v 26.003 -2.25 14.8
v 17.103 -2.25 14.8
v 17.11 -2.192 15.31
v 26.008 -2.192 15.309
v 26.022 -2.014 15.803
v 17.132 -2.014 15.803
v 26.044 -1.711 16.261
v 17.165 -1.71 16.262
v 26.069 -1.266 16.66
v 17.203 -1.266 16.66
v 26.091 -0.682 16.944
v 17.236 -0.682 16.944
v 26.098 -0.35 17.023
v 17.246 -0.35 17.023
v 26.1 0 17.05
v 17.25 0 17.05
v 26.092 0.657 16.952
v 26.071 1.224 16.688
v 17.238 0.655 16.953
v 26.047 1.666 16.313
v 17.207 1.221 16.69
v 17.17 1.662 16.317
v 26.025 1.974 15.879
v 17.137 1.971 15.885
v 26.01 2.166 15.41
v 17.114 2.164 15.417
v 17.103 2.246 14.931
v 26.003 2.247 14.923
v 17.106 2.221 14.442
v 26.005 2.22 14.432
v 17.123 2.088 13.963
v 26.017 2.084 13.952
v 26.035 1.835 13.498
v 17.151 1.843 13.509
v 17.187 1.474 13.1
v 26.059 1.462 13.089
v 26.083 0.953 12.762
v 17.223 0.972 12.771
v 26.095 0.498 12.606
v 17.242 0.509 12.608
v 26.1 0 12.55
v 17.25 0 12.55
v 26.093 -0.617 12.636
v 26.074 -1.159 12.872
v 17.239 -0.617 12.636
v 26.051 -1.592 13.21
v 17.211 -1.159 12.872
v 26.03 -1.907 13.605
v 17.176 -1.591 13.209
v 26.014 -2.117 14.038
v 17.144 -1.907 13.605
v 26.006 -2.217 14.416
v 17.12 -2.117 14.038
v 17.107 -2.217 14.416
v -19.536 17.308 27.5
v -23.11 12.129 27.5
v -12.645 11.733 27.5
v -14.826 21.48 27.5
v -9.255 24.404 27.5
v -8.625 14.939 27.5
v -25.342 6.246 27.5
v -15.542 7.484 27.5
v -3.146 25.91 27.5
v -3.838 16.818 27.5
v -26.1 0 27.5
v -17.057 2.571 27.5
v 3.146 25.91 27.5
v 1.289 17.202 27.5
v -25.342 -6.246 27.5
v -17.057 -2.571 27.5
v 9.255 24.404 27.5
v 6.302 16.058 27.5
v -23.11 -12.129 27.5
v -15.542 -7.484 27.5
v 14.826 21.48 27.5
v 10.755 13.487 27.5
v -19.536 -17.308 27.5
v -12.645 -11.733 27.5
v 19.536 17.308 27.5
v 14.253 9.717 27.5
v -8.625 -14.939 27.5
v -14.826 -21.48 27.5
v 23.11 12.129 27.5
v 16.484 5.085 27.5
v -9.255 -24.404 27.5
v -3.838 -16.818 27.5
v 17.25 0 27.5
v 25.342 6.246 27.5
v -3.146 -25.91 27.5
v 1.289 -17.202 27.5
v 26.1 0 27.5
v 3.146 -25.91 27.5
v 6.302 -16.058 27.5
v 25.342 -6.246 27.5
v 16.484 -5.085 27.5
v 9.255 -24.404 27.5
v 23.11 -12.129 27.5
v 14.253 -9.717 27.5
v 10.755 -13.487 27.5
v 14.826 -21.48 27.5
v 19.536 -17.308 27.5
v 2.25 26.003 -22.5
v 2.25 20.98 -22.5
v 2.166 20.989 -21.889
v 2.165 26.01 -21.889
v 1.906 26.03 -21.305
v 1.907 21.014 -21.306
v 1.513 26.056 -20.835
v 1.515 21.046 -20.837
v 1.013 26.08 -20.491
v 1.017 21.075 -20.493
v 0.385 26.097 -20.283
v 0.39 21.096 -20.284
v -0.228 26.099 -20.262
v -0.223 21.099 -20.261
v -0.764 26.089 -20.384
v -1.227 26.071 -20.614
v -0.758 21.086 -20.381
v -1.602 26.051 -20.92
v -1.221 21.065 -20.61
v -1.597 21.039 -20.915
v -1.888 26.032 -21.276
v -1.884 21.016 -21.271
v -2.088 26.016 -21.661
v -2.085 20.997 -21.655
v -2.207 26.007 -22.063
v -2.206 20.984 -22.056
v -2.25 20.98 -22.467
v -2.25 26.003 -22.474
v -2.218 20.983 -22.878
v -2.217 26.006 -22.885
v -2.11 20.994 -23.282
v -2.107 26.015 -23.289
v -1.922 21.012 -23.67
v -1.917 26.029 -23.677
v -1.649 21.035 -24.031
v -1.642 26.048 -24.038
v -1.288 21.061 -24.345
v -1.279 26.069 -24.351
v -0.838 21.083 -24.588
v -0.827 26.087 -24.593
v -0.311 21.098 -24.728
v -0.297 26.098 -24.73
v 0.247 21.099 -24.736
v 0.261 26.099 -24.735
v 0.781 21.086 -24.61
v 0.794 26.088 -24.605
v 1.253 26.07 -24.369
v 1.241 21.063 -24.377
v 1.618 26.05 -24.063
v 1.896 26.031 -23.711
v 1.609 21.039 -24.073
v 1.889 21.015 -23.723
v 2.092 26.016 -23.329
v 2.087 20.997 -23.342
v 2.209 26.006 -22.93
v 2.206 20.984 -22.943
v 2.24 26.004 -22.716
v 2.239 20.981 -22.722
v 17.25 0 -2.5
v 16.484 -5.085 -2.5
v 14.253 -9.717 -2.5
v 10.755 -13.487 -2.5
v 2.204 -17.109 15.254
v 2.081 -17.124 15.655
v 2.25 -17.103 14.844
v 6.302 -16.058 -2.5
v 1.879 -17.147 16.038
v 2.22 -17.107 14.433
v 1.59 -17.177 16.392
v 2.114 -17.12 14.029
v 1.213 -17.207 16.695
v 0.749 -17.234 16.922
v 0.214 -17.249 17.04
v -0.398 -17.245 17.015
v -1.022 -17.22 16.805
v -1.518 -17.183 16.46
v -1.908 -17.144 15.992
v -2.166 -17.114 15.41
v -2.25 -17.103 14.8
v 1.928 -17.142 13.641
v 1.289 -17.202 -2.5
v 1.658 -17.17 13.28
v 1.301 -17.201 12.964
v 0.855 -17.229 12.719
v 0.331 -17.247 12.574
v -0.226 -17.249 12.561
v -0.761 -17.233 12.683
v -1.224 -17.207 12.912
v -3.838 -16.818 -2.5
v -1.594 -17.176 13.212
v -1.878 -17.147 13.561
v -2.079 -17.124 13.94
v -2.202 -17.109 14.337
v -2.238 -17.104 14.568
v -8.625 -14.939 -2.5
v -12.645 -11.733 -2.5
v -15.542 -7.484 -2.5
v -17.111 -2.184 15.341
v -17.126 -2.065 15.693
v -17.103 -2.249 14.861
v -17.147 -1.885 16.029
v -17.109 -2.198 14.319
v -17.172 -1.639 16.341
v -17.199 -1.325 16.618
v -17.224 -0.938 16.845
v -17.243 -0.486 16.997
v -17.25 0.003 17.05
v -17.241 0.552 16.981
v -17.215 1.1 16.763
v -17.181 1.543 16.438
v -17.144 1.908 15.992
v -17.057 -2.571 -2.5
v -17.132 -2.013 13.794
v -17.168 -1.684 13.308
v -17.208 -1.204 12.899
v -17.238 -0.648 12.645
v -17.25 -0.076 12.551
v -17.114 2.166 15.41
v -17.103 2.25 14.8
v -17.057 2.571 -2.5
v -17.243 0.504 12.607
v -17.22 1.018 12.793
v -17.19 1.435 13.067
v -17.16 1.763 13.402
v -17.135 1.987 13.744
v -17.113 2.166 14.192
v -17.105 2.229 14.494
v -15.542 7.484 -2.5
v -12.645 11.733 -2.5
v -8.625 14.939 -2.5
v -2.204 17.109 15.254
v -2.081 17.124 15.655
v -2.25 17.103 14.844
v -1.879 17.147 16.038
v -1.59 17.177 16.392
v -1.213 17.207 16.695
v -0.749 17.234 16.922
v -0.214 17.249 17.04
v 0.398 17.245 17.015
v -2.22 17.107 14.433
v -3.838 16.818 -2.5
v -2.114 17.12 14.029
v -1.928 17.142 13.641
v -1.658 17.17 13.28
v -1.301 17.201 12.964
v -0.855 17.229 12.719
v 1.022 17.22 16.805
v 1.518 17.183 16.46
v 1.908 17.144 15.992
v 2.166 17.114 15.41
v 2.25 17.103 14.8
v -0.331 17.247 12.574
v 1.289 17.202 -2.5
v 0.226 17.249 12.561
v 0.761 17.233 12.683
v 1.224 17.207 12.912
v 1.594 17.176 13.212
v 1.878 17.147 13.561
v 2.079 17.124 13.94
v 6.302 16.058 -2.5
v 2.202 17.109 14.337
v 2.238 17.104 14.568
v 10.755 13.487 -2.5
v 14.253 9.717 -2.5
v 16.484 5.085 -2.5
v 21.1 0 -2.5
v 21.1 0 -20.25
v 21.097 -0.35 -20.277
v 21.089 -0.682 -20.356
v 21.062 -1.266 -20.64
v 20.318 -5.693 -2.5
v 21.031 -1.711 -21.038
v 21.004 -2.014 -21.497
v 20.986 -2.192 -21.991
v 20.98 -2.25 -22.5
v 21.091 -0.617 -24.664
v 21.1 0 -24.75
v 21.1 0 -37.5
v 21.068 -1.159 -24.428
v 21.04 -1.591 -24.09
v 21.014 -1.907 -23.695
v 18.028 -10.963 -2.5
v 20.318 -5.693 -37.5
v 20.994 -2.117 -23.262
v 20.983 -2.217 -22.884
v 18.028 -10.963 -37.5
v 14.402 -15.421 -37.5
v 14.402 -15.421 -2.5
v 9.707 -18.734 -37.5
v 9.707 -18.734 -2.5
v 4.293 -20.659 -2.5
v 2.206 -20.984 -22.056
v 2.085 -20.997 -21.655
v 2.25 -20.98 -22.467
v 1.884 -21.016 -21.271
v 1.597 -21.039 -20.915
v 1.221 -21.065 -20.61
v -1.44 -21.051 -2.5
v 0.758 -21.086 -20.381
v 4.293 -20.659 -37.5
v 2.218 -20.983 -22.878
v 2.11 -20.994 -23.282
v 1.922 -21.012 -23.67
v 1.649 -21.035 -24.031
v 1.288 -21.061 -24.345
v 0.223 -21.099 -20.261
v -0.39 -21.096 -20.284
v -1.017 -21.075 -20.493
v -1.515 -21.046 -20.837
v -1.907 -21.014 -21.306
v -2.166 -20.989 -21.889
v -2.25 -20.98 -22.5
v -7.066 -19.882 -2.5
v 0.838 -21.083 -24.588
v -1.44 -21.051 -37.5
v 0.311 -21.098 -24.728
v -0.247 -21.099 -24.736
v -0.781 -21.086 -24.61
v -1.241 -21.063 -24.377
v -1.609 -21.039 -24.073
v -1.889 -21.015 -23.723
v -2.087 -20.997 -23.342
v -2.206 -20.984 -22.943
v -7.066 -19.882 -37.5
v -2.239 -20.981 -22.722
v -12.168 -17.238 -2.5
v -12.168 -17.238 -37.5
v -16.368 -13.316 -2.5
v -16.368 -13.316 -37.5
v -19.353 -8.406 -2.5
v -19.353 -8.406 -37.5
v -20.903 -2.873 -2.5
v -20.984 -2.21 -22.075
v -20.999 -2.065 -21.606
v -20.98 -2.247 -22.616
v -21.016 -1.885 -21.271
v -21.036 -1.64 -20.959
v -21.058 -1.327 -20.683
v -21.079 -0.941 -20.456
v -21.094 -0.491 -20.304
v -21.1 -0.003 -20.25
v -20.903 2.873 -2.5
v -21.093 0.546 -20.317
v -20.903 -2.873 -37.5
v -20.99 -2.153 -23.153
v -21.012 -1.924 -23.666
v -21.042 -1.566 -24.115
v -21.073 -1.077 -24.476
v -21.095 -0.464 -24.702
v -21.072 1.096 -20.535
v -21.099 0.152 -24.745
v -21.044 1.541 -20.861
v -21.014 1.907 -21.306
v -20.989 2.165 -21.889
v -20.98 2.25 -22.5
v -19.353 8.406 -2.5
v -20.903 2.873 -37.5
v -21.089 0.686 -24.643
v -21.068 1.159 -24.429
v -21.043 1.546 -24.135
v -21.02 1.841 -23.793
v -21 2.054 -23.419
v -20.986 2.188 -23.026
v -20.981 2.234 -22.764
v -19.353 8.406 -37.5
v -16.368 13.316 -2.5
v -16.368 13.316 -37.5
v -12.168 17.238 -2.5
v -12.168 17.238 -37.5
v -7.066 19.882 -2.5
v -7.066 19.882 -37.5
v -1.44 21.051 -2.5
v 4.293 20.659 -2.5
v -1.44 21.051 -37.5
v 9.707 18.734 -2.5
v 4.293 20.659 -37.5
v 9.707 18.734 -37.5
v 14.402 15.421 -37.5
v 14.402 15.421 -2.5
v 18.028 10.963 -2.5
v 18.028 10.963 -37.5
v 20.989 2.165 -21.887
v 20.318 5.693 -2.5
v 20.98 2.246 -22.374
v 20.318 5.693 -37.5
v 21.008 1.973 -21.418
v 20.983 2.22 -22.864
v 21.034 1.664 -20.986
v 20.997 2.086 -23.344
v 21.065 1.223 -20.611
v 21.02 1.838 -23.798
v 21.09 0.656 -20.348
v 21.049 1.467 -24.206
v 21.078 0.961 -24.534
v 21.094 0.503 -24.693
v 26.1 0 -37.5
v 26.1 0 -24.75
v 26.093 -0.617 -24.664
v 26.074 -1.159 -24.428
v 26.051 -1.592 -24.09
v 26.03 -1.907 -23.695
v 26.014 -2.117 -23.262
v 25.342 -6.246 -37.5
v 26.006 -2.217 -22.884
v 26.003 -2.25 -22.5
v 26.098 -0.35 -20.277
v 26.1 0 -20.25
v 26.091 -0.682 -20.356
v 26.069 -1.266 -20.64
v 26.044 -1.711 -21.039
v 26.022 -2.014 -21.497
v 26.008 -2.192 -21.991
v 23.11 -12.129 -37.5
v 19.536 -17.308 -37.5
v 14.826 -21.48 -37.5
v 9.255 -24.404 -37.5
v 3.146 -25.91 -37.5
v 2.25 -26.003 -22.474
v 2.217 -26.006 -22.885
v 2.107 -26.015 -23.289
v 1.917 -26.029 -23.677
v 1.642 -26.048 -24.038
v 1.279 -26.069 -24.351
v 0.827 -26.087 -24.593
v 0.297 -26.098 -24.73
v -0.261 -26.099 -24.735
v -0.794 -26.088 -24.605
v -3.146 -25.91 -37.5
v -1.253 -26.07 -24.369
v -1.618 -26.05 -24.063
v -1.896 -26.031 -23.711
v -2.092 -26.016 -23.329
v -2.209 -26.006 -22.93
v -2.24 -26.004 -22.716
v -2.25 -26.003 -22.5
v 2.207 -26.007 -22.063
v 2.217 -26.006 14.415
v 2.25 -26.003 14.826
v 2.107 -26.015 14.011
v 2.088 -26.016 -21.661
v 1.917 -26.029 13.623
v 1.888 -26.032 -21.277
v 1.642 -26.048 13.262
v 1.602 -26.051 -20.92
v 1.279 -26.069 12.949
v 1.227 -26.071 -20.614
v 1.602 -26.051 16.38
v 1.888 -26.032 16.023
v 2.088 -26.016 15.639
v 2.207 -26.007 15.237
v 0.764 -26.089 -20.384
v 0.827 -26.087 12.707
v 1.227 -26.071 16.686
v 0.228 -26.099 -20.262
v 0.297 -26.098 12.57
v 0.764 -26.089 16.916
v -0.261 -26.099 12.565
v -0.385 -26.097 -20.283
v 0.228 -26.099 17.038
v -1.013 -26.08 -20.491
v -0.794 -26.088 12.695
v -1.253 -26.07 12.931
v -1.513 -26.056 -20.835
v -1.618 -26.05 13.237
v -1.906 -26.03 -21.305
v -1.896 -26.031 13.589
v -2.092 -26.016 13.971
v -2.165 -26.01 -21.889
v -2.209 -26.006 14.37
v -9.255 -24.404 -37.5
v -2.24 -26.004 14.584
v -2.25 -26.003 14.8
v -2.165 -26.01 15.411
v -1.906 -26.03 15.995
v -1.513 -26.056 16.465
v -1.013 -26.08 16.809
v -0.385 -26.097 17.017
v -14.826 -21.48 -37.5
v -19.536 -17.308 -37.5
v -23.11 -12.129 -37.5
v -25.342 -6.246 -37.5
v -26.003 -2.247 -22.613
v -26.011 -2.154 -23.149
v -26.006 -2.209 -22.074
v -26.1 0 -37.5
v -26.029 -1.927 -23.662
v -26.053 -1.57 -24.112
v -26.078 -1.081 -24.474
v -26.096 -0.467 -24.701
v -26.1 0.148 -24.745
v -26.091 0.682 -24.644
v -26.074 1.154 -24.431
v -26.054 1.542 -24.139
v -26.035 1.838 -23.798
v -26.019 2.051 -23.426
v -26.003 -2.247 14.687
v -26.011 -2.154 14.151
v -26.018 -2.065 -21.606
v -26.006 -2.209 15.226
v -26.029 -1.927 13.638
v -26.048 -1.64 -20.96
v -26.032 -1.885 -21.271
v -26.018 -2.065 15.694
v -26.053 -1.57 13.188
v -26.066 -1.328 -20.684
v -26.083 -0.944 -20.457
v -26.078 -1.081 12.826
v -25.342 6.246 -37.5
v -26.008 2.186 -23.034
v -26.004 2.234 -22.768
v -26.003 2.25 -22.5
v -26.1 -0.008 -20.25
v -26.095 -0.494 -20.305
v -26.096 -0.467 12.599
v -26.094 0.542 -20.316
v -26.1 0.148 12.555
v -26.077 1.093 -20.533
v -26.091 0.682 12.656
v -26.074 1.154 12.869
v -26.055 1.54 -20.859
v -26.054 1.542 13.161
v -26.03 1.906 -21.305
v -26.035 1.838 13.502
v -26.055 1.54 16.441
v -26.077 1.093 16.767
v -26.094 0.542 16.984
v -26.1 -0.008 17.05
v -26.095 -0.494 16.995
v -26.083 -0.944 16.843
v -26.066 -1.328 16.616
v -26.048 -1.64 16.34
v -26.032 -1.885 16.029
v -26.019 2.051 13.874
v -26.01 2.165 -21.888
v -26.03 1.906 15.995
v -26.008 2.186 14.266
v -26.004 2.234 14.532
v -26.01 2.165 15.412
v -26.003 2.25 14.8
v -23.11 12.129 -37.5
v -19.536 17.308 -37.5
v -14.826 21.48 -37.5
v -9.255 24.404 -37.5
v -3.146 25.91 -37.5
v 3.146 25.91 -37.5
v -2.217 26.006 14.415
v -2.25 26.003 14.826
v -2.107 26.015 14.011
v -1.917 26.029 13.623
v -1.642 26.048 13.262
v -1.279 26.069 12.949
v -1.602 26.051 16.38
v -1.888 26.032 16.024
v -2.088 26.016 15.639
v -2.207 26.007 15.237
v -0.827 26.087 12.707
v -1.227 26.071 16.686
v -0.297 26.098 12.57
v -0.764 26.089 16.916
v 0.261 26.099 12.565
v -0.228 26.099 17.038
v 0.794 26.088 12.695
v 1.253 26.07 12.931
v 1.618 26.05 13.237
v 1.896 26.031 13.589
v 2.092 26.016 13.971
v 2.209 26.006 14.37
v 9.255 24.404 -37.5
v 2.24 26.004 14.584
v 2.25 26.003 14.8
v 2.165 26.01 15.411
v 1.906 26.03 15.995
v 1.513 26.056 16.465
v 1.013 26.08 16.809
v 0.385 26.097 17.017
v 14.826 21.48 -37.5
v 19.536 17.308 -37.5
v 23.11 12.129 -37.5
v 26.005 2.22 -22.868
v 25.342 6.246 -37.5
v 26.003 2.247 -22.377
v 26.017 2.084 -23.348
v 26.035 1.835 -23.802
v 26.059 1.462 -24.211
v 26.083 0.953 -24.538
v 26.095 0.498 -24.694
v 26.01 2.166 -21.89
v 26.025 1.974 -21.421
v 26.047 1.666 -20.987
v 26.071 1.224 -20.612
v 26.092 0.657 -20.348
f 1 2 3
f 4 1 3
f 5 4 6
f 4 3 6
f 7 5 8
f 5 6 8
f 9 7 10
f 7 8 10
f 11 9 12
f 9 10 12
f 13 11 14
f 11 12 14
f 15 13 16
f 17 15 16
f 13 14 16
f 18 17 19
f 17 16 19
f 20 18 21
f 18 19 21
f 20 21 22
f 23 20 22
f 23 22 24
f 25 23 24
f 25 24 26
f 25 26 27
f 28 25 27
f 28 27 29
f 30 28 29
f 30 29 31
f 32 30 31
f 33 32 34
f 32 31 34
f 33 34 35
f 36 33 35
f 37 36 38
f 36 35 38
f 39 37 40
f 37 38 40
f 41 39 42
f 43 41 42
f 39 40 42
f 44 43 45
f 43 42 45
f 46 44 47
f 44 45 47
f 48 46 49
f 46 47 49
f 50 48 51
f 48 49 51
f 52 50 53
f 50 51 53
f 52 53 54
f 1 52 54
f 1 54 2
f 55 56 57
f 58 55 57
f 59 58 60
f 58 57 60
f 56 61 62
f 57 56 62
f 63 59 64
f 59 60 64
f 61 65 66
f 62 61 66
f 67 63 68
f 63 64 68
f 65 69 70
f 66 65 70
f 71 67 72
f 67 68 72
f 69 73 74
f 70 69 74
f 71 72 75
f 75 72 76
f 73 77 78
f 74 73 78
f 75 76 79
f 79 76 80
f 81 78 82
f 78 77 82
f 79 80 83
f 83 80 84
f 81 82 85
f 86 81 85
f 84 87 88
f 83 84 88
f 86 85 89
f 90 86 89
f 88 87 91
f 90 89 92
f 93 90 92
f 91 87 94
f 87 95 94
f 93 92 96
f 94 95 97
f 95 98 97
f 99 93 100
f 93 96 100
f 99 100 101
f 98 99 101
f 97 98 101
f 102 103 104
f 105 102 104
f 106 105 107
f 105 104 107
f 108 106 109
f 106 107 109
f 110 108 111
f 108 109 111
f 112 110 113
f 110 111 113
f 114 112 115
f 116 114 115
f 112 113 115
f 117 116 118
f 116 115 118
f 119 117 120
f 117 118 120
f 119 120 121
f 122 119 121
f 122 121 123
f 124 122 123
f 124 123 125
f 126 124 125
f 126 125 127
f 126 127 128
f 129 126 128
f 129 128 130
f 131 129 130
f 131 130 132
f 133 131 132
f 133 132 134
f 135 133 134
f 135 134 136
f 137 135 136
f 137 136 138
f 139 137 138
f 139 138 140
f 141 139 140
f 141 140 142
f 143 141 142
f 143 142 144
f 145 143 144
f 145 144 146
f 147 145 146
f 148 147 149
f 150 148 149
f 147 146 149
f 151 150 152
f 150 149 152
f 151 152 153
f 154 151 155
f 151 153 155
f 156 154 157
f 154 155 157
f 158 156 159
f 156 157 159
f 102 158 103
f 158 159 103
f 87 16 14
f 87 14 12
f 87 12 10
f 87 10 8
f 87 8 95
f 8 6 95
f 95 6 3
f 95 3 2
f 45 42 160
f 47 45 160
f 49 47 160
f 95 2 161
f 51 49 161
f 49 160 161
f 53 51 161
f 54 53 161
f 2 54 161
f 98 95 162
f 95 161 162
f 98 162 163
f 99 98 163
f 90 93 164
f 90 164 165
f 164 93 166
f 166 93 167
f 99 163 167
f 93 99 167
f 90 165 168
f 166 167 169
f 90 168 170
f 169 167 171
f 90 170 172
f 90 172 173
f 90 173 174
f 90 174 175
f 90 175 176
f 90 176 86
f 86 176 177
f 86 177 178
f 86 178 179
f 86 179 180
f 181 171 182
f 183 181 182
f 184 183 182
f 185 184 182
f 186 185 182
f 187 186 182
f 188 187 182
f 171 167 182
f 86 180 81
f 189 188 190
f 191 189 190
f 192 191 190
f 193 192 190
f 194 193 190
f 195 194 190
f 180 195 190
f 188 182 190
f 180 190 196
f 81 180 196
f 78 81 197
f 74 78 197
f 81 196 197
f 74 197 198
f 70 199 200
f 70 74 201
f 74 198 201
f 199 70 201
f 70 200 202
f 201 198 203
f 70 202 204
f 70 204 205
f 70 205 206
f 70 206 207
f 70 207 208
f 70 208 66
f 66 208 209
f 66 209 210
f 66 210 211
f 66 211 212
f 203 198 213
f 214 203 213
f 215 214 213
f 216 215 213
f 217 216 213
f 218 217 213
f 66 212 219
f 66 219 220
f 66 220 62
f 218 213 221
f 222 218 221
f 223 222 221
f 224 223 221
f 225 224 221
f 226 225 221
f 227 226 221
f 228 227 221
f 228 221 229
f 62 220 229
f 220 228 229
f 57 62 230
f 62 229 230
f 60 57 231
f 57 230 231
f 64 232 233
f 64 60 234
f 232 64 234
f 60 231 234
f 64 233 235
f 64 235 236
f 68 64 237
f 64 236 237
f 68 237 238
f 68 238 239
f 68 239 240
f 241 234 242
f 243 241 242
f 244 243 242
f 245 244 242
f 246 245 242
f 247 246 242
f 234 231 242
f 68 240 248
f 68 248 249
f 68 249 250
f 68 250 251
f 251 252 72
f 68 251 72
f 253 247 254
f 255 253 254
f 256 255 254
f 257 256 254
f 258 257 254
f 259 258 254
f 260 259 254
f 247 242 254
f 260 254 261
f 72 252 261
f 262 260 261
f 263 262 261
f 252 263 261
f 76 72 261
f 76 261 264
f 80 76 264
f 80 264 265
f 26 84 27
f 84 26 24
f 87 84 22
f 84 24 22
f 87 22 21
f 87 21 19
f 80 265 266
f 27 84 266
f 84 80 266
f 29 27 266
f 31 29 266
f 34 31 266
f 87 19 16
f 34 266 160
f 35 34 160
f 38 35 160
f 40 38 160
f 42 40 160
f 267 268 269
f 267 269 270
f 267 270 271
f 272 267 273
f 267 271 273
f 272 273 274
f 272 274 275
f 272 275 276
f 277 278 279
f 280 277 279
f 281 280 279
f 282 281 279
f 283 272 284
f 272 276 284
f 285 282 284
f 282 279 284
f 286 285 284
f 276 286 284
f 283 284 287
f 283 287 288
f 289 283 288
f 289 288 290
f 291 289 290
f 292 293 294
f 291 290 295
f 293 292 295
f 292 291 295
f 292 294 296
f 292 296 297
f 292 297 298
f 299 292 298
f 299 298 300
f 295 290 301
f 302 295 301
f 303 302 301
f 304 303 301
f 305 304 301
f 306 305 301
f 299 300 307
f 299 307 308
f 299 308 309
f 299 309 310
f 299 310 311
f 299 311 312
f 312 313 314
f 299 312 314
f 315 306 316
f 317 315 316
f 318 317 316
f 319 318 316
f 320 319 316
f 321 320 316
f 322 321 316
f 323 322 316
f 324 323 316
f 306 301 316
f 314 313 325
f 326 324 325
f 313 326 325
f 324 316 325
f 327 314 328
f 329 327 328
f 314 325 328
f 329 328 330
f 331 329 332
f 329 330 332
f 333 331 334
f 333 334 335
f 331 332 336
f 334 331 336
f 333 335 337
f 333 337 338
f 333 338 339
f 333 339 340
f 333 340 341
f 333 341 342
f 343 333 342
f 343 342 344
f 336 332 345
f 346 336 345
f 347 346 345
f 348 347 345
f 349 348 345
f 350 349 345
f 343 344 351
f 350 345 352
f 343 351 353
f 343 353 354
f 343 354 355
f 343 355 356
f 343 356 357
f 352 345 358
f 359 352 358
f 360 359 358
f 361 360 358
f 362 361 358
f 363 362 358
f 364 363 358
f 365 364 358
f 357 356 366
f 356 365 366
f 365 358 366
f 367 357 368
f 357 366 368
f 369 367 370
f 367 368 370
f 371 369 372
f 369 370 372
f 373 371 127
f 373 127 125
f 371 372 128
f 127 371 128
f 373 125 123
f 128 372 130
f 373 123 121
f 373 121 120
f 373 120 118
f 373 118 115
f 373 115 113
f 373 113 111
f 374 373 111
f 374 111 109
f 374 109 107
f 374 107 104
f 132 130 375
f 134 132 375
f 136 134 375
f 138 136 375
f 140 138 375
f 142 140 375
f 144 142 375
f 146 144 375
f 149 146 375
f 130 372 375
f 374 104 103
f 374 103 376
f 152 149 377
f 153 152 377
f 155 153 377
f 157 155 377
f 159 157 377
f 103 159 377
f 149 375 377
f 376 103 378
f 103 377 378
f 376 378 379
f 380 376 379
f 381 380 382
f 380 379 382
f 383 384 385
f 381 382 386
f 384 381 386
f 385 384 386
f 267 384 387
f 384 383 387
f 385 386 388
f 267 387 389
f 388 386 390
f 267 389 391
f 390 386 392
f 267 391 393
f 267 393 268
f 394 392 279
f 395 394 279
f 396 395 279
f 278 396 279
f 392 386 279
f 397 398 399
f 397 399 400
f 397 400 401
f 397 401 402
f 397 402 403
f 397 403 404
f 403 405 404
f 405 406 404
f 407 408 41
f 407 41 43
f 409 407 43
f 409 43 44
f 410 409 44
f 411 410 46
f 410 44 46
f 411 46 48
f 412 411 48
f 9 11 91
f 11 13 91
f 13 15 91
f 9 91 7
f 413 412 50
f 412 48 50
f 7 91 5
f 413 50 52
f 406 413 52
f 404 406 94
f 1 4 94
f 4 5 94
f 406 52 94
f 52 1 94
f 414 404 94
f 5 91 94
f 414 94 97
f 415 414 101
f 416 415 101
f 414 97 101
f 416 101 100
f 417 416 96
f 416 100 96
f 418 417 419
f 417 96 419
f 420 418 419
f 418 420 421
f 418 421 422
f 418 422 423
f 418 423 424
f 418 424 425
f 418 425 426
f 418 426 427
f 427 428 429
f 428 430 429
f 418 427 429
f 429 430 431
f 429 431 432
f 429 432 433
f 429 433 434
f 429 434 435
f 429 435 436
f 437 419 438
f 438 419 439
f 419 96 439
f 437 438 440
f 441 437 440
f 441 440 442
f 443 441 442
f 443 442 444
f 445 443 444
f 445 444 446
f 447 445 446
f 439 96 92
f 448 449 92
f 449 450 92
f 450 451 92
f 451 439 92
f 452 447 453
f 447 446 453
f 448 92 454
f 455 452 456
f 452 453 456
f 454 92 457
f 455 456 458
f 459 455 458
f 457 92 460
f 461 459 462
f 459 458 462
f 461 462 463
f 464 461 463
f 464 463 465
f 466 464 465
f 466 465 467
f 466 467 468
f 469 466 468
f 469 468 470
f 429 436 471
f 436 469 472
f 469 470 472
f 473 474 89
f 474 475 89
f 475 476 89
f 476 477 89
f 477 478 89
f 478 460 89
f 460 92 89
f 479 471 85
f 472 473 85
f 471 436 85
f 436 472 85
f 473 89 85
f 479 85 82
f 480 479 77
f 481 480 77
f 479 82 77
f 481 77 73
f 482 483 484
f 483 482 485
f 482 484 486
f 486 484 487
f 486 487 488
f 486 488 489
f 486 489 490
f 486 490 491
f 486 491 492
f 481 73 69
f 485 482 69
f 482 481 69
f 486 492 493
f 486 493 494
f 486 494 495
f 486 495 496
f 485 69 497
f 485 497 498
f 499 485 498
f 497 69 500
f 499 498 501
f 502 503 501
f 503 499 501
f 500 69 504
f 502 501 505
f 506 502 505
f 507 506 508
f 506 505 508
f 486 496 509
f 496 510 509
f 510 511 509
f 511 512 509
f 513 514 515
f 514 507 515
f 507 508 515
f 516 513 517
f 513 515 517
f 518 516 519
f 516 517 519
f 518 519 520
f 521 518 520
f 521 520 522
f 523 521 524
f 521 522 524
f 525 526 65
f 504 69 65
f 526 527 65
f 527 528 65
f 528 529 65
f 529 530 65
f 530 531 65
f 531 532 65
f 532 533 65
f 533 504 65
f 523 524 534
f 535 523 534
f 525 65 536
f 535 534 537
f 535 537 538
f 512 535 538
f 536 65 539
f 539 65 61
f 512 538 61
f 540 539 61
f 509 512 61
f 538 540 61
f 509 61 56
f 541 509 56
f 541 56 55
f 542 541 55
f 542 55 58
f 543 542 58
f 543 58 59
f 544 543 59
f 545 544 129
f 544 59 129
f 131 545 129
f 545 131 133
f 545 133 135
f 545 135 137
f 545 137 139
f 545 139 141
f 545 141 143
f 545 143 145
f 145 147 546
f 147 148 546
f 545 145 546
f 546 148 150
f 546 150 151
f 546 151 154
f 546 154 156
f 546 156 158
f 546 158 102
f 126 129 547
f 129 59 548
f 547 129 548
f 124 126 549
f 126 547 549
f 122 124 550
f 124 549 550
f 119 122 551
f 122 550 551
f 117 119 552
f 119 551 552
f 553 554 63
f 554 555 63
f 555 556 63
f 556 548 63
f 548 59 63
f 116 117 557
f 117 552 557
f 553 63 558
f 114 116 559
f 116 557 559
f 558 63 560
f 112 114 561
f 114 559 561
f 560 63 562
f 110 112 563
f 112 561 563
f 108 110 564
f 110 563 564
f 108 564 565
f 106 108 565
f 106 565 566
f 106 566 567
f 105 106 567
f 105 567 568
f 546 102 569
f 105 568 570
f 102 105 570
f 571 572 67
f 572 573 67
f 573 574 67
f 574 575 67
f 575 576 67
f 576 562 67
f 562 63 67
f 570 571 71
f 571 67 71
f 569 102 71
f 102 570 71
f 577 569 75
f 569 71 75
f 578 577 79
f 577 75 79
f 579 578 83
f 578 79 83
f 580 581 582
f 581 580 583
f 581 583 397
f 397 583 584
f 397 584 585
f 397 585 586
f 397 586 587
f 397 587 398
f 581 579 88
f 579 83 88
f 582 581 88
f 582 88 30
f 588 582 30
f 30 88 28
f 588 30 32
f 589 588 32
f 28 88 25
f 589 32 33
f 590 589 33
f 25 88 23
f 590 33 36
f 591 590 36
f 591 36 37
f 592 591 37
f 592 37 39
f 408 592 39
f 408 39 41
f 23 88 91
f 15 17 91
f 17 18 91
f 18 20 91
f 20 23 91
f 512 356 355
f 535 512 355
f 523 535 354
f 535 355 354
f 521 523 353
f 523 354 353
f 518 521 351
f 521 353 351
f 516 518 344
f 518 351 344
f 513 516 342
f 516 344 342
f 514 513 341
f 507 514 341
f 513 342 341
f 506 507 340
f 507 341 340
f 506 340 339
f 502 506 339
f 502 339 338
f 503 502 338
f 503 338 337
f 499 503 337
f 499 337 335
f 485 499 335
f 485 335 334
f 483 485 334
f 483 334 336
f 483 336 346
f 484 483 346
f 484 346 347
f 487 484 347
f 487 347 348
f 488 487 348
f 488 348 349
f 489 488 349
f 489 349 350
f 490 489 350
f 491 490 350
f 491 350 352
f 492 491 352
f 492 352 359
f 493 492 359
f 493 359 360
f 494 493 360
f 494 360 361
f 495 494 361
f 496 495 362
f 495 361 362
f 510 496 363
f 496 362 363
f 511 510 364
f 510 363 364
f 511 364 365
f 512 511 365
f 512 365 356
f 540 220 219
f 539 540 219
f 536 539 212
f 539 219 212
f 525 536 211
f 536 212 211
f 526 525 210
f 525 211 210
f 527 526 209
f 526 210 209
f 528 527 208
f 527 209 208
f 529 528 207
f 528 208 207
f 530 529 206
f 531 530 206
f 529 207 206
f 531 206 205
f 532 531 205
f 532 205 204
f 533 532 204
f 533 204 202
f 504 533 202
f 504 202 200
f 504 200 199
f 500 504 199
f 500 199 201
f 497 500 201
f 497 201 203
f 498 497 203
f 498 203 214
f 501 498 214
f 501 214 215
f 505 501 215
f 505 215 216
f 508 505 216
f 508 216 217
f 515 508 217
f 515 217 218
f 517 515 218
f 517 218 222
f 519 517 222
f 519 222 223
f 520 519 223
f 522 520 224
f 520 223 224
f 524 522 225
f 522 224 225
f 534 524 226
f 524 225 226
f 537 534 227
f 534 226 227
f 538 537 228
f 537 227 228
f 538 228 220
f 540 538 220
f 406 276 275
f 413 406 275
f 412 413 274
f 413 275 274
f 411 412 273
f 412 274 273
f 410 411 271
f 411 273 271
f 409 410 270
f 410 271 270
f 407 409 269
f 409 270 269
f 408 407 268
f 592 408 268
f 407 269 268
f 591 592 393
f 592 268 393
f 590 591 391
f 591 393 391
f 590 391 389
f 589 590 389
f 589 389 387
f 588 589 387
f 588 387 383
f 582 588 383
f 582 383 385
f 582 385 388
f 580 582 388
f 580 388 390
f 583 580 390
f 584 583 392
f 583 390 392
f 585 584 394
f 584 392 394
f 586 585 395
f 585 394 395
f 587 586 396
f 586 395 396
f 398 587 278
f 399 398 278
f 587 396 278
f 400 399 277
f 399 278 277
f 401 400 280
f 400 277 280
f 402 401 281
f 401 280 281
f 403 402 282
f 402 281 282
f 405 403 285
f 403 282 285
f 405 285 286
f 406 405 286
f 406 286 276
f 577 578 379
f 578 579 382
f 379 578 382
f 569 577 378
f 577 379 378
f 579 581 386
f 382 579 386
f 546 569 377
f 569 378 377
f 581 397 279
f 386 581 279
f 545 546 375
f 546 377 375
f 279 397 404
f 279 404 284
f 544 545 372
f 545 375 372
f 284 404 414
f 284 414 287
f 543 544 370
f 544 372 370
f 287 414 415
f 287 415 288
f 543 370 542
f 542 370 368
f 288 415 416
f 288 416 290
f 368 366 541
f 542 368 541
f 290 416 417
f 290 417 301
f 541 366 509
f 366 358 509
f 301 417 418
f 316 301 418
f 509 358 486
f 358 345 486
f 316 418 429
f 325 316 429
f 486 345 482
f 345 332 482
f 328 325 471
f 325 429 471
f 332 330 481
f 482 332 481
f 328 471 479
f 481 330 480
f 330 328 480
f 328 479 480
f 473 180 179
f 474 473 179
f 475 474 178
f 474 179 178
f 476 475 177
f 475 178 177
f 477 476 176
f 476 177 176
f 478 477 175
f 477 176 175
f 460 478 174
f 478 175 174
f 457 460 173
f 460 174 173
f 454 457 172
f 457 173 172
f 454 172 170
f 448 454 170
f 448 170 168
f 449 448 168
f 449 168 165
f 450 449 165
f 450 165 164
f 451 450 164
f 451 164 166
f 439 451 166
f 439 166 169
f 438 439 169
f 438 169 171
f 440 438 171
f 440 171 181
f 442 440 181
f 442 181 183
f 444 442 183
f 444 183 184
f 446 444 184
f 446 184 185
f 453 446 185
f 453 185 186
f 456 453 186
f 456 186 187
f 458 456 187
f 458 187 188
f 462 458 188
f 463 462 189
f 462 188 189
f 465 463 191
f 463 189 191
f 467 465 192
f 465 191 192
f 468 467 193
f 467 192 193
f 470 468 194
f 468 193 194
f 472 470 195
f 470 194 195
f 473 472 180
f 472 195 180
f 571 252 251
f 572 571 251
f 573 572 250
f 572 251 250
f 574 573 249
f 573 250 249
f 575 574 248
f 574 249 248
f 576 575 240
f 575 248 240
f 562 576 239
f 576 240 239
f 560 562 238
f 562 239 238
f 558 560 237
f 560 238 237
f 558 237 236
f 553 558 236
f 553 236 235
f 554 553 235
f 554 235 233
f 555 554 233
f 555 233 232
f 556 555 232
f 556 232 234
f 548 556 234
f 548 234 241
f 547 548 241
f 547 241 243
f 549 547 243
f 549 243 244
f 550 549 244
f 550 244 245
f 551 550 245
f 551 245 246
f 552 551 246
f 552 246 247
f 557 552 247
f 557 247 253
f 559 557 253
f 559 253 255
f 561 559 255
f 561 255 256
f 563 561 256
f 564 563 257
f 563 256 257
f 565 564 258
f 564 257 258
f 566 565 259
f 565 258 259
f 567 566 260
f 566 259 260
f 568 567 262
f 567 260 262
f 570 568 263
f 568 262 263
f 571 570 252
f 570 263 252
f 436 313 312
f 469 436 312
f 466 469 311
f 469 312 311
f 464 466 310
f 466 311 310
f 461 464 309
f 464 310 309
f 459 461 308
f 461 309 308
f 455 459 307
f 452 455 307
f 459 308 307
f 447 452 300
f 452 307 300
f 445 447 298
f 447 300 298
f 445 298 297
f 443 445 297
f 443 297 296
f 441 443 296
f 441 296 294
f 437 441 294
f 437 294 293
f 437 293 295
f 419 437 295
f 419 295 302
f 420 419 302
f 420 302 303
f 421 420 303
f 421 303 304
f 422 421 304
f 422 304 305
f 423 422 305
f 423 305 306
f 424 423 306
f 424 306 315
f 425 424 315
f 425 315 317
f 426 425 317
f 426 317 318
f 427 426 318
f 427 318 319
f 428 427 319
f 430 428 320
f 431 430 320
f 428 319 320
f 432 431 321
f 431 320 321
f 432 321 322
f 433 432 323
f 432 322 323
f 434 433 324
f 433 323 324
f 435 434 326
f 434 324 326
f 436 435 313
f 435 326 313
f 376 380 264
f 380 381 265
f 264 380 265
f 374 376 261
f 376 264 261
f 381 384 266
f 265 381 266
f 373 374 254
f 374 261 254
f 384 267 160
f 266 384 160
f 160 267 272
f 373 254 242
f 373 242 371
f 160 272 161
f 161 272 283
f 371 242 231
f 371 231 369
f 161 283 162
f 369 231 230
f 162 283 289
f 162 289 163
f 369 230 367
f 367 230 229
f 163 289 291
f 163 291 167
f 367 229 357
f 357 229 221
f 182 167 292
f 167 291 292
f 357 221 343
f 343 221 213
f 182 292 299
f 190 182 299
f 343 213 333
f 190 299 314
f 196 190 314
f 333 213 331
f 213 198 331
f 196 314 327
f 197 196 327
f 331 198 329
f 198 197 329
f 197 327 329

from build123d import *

# Parameters (mm, degrees)
F2_R            = 2.25
F3_DEPTH        = 28
F3_COPIES_COUNT = 4


# Not quite as in the source:
# - a pattern or mirror of a feature is missing from the dataset's text; its kind, count and spacing are read off the source's solid


with BuildPart() as f1:
    # F0 (on Front) → F1 (revolve)
    with BuildSketch(Plane.XZ):
        Polygon((26.1, 27.5), (17.25, 27.5), (17.25, 2.5), (17.25, -2.5), (21.1, -2.5), (21.1, -37.5), (26.1, -37.5), align=None)
    revolve(axis=Axis((0, 0, 0), (0, 0, -1)))

    # F2 (on Front) → F3 (cut)
    with BuildSketch(Plane.XZ):
        with Locations((0, 14.8)):
            Circle(F2_R)
        with Locations((0, -22.5)):
            Circle(F2_R)
    f3 = extrude(amount=-F3_DEPTH, mode=Mode.SUBTRACT)

    # F3_copies: F3 ×4 about axis
    f3_copies_axis = Axis((0, 0, 0), (0, 0, 1))
    for i in range(1, F3_COPIES_COUNT):
        add(f3.rotate(f3_copies_axis, i * 360 / F3_COPIES_COUNT), mode=Mode.SUBTRACT)


solid = f1.part
